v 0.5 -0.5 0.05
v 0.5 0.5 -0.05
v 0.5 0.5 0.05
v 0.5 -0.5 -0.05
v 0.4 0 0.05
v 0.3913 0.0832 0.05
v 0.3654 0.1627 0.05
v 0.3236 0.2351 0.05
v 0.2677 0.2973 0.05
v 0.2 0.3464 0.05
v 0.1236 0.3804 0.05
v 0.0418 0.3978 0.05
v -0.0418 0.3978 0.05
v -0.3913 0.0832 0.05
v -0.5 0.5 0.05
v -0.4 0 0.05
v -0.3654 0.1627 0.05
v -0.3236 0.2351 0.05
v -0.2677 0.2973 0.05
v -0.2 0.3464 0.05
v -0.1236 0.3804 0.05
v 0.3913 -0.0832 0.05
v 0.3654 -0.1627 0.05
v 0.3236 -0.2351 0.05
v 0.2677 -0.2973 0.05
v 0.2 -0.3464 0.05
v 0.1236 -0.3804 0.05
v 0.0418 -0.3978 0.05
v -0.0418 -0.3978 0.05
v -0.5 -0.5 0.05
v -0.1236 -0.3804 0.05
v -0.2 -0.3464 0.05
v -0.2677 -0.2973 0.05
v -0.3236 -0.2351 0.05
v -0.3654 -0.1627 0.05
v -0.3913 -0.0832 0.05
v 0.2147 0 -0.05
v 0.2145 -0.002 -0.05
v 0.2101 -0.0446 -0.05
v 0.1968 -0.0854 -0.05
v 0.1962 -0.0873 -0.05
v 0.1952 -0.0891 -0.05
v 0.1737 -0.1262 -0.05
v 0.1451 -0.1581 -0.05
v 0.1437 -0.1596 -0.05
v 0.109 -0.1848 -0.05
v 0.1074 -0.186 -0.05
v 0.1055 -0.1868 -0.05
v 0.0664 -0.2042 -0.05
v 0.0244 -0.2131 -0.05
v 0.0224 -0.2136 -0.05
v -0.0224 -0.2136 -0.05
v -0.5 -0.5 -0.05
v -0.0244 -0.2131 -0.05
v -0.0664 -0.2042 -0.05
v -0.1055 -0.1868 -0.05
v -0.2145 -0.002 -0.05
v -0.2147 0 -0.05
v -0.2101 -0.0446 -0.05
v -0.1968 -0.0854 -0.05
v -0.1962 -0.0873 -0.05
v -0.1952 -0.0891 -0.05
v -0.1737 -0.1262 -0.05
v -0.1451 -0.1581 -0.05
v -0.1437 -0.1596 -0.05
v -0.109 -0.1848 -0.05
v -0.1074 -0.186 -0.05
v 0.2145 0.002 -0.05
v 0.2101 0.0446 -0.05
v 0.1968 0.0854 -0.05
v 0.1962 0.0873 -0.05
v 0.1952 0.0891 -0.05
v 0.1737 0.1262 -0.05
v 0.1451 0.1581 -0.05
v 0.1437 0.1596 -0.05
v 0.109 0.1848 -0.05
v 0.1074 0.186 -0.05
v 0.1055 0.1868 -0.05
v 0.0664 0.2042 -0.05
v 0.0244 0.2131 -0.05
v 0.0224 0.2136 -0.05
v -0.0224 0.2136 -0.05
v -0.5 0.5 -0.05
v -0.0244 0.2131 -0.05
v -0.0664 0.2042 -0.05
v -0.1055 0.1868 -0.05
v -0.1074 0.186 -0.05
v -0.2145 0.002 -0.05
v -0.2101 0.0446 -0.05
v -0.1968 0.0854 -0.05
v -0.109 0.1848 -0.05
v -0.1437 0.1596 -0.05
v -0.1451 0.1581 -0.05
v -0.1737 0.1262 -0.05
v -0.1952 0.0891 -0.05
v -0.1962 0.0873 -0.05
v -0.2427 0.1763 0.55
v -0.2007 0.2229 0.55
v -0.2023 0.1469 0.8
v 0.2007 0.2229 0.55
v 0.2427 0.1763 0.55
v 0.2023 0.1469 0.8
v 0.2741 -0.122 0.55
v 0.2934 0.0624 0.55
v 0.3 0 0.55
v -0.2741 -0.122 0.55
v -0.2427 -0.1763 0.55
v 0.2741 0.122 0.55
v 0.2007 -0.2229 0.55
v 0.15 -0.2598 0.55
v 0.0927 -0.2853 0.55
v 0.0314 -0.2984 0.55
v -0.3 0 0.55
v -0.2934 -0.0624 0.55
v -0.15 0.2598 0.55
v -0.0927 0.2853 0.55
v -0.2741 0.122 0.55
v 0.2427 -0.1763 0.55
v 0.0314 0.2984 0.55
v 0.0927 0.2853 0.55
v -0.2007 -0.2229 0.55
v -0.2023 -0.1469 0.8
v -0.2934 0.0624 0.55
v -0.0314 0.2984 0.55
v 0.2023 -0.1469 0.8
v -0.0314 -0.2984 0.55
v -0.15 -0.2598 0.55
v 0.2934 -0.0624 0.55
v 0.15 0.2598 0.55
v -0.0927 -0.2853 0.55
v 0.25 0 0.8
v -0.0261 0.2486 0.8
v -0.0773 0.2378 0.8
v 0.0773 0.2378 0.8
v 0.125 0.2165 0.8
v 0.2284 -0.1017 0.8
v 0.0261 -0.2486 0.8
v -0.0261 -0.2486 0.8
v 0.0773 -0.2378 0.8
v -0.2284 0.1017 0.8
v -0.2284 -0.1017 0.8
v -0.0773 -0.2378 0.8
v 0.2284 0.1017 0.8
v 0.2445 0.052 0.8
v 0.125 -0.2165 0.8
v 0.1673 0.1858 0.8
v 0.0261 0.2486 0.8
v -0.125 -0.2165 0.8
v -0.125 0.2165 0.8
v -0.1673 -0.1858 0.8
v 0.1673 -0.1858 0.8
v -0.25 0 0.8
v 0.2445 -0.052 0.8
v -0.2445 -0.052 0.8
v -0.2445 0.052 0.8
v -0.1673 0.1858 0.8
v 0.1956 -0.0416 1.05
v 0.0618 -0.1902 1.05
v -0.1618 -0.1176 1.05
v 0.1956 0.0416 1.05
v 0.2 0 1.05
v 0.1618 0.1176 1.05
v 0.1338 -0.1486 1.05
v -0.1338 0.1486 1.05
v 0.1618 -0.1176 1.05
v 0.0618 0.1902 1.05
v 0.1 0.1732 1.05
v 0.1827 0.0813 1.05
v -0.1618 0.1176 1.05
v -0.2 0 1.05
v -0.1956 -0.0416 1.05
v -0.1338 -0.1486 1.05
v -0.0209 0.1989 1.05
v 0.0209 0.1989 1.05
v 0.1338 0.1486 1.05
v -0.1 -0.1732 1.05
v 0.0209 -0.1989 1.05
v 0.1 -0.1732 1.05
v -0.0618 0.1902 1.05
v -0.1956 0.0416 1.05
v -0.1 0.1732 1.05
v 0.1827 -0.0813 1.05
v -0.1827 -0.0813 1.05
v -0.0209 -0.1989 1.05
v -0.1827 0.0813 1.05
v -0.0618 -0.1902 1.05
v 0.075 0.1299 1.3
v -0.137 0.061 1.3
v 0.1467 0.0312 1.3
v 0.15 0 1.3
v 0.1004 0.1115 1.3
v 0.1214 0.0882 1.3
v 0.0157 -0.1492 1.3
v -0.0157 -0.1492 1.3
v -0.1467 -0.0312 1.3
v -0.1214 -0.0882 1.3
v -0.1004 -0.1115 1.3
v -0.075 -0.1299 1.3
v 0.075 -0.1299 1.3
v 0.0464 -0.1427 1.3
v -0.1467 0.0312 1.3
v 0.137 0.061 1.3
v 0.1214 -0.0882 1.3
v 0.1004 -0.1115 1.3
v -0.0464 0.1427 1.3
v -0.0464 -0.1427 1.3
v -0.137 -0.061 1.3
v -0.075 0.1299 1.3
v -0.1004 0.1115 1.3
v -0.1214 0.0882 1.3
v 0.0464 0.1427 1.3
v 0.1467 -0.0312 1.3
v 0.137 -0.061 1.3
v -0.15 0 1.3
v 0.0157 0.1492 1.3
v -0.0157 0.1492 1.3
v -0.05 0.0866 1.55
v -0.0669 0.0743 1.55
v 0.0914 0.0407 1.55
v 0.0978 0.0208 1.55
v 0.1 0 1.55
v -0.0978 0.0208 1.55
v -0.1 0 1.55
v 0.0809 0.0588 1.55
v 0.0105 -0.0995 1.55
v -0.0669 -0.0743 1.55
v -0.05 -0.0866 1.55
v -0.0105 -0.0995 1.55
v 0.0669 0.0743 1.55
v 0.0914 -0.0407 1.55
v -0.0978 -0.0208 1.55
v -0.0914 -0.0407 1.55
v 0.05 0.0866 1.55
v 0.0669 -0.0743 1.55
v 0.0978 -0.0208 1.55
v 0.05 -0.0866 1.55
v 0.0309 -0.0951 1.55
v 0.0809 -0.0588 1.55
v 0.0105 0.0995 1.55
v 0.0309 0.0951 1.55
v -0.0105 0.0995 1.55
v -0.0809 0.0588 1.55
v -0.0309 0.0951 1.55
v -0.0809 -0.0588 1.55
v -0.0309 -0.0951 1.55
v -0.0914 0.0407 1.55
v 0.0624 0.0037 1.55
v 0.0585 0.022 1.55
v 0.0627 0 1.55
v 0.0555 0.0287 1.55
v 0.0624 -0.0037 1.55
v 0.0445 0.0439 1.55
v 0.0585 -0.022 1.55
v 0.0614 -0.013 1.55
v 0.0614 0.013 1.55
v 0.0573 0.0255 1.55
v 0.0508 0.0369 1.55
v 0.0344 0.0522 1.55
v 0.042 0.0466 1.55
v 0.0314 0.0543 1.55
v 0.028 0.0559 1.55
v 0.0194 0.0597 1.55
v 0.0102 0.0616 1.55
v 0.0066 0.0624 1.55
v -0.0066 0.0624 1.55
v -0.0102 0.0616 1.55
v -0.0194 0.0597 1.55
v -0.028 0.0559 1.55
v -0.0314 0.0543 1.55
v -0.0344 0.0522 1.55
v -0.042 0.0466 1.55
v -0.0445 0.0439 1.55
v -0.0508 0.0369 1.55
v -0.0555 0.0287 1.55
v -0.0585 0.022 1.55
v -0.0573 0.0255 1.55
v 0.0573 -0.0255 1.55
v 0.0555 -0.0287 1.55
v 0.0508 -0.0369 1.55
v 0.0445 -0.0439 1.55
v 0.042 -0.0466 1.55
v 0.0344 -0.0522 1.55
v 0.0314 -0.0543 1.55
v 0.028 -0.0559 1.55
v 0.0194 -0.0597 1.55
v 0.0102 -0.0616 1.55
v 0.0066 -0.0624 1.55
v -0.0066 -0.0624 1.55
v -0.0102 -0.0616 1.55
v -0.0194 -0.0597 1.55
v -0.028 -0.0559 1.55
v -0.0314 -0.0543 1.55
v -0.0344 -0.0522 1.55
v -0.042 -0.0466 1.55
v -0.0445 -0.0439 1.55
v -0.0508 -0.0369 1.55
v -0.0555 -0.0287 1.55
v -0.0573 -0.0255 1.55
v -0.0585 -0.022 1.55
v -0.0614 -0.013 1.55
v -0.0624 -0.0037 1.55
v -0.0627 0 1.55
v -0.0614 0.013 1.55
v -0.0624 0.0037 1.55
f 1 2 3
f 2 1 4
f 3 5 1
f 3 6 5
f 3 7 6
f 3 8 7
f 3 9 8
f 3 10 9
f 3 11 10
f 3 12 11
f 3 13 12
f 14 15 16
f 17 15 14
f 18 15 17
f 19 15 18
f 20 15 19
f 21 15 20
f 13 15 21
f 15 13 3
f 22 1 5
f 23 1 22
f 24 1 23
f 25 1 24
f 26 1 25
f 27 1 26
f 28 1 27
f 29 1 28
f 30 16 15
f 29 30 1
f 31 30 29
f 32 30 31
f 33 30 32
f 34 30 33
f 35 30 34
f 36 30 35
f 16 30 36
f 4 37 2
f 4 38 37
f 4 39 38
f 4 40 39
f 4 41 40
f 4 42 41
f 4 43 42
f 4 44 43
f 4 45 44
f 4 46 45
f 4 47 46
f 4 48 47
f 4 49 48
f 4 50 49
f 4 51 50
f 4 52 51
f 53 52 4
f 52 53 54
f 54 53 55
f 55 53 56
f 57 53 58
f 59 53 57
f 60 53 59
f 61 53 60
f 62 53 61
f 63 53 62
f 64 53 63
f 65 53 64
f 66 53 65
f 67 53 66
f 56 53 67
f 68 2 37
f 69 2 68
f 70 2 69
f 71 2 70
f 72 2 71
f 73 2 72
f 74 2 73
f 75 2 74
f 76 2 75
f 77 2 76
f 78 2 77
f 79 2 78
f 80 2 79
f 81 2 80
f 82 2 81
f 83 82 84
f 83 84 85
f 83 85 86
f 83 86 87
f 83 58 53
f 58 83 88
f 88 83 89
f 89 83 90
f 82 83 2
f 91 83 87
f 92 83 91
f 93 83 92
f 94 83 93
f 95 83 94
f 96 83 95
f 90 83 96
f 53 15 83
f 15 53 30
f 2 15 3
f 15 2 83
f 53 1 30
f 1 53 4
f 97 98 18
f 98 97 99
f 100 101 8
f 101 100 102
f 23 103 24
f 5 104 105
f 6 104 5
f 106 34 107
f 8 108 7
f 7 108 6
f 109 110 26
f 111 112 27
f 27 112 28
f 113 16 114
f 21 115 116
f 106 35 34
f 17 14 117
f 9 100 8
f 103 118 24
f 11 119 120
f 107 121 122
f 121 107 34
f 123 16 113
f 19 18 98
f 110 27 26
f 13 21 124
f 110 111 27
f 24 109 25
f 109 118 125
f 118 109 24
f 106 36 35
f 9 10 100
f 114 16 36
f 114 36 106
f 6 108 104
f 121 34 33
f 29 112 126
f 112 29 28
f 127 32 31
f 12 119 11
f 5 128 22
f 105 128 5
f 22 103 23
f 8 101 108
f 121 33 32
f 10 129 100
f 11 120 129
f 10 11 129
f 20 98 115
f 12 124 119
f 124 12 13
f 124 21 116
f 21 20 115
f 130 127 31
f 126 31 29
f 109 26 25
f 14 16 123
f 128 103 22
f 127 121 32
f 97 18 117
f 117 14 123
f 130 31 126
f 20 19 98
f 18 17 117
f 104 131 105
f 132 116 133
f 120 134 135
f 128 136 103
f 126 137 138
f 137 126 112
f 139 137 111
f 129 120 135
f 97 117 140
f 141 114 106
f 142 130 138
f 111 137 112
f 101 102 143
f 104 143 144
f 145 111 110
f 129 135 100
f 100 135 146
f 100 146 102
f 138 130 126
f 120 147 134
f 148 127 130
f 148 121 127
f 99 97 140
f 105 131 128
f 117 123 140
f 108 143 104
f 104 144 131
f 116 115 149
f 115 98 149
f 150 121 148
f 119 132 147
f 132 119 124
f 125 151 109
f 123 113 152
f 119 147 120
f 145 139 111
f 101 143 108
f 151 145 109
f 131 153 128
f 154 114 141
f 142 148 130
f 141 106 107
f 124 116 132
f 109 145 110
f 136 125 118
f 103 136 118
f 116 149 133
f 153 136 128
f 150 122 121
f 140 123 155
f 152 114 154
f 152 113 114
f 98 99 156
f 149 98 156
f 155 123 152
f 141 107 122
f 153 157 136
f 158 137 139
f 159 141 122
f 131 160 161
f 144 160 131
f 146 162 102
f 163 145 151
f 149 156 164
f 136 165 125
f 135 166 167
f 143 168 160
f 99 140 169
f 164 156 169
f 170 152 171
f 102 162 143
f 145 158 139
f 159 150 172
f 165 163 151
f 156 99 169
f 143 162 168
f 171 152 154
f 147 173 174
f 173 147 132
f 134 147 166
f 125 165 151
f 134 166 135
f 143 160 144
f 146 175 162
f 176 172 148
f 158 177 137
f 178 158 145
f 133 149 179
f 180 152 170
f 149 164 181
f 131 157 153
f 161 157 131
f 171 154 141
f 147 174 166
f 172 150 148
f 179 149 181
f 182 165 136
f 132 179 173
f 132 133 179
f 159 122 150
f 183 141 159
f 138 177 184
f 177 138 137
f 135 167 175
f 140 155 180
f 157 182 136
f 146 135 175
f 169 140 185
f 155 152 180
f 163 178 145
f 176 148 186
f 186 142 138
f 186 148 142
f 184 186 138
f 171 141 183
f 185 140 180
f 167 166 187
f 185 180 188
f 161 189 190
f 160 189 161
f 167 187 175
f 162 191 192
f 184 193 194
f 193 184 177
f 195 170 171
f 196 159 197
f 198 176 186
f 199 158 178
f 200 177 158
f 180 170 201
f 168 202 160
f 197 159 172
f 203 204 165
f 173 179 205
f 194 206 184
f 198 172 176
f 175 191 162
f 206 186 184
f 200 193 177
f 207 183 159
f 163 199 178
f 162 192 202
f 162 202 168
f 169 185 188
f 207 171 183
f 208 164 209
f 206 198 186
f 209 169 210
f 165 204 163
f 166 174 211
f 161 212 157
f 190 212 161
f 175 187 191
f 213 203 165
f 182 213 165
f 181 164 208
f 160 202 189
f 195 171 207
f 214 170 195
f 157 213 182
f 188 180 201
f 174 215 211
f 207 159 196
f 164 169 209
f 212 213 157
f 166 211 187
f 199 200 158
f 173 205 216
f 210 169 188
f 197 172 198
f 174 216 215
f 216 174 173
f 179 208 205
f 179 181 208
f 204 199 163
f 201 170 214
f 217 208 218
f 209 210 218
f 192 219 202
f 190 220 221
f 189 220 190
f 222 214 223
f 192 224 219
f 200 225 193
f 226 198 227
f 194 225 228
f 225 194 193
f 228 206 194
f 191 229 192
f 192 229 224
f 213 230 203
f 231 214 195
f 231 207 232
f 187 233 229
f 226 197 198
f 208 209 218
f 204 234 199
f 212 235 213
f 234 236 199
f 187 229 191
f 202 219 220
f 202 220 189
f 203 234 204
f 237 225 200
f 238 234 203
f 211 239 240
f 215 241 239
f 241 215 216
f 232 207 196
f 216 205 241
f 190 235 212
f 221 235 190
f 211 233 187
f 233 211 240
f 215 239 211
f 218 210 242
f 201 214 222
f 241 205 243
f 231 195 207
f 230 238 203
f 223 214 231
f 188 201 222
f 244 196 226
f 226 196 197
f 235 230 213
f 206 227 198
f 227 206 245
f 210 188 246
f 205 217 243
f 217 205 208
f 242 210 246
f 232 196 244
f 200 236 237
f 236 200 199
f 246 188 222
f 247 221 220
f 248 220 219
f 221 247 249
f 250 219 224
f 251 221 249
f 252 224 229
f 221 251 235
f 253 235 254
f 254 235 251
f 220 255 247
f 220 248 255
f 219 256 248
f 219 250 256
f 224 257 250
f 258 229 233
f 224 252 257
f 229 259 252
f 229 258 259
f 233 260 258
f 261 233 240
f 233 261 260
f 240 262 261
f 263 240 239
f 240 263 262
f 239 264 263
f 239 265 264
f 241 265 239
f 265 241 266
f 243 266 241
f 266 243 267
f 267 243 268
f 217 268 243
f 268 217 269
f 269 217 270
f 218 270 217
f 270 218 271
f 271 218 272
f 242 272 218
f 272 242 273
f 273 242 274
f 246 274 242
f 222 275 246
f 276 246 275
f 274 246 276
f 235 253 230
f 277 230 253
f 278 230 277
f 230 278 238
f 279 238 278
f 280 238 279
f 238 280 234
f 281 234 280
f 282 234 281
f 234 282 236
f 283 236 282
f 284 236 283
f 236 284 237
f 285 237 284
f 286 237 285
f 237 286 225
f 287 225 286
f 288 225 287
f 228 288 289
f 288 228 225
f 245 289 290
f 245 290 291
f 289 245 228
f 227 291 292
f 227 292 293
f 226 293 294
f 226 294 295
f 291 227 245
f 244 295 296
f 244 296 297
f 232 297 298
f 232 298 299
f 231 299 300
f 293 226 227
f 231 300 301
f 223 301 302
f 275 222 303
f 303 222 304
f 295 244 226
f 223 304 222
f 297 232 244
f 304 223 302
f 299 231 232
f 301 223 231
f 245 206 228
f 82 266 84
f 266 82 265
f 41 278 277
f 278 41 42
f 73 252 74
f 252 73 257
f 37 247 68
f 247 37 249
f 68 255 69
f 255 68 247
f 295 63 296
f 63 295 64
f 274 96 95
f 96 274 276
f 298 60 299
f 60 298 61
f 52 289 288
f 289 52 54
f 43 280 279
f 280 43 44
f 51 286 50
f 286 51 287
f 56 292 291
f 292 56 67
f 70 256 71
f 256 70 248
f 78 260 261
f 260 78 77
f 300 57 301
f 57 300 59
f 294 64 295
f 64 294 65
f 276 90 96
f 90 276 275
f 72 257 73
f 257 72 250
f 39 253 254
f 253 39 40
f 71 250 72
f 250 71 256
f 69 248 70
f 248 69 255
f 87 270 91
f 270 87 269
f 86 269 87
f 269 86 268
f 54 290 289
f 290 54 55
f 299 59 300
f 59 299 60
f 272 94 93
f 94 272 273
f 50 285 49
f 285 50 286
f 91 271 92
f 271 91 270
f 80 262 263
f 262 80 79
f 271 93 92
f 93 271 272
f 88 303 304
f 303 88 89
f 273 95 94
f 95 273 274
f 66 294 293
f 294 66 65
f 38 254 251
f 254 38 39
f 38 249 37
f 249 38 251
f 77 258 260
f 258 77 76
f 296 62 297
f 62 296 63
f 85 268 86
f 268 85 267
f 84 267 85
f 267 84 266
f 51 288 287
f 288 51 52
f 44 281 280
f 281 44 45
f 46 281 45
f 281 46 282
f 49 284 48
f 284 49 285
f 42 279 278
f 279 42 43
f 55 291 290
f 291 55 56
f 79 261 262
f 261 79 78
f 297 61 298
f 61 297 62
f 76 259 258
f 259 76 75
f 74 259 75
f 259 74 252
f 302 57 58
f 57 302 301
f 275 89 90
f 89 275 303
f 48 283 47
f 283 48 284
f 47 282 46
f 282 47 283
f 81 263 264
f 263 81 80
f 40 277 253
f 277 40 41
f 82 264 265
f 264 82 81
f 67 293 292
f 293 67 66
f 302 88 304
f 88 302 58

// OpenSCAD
module Cone_01(){

   difference(){
   
   union(){
       color("orange")
       cube([1,1,0.1], center = true);
       
       color("orange")
       translate([0,0,0.05])
       cylinder(0.5,0.4,0.3, $fn = 30);
       
       color("white")
       translate([0,0,0.55])
       cylinder(0.25,0.3,0.25, $fn = 30);
       
       color("orange")
       translate([0,0,0.8])
       cylinder(0.25,0.25,0.2, $fn = 30);
       
       color("white")
       translate([0,0,1.05])
       cylinder(0.25,0.2,0.15, $fn = 30);
       
       color("orange")
       translate([0,0,1.3])
       cylinder(0.25,0.15,0.1, $fn = 30);
       }
   
   cylinder(4,0.4,0.02, $fn = 30,center =true);
   }
    
}


Cone_01();
